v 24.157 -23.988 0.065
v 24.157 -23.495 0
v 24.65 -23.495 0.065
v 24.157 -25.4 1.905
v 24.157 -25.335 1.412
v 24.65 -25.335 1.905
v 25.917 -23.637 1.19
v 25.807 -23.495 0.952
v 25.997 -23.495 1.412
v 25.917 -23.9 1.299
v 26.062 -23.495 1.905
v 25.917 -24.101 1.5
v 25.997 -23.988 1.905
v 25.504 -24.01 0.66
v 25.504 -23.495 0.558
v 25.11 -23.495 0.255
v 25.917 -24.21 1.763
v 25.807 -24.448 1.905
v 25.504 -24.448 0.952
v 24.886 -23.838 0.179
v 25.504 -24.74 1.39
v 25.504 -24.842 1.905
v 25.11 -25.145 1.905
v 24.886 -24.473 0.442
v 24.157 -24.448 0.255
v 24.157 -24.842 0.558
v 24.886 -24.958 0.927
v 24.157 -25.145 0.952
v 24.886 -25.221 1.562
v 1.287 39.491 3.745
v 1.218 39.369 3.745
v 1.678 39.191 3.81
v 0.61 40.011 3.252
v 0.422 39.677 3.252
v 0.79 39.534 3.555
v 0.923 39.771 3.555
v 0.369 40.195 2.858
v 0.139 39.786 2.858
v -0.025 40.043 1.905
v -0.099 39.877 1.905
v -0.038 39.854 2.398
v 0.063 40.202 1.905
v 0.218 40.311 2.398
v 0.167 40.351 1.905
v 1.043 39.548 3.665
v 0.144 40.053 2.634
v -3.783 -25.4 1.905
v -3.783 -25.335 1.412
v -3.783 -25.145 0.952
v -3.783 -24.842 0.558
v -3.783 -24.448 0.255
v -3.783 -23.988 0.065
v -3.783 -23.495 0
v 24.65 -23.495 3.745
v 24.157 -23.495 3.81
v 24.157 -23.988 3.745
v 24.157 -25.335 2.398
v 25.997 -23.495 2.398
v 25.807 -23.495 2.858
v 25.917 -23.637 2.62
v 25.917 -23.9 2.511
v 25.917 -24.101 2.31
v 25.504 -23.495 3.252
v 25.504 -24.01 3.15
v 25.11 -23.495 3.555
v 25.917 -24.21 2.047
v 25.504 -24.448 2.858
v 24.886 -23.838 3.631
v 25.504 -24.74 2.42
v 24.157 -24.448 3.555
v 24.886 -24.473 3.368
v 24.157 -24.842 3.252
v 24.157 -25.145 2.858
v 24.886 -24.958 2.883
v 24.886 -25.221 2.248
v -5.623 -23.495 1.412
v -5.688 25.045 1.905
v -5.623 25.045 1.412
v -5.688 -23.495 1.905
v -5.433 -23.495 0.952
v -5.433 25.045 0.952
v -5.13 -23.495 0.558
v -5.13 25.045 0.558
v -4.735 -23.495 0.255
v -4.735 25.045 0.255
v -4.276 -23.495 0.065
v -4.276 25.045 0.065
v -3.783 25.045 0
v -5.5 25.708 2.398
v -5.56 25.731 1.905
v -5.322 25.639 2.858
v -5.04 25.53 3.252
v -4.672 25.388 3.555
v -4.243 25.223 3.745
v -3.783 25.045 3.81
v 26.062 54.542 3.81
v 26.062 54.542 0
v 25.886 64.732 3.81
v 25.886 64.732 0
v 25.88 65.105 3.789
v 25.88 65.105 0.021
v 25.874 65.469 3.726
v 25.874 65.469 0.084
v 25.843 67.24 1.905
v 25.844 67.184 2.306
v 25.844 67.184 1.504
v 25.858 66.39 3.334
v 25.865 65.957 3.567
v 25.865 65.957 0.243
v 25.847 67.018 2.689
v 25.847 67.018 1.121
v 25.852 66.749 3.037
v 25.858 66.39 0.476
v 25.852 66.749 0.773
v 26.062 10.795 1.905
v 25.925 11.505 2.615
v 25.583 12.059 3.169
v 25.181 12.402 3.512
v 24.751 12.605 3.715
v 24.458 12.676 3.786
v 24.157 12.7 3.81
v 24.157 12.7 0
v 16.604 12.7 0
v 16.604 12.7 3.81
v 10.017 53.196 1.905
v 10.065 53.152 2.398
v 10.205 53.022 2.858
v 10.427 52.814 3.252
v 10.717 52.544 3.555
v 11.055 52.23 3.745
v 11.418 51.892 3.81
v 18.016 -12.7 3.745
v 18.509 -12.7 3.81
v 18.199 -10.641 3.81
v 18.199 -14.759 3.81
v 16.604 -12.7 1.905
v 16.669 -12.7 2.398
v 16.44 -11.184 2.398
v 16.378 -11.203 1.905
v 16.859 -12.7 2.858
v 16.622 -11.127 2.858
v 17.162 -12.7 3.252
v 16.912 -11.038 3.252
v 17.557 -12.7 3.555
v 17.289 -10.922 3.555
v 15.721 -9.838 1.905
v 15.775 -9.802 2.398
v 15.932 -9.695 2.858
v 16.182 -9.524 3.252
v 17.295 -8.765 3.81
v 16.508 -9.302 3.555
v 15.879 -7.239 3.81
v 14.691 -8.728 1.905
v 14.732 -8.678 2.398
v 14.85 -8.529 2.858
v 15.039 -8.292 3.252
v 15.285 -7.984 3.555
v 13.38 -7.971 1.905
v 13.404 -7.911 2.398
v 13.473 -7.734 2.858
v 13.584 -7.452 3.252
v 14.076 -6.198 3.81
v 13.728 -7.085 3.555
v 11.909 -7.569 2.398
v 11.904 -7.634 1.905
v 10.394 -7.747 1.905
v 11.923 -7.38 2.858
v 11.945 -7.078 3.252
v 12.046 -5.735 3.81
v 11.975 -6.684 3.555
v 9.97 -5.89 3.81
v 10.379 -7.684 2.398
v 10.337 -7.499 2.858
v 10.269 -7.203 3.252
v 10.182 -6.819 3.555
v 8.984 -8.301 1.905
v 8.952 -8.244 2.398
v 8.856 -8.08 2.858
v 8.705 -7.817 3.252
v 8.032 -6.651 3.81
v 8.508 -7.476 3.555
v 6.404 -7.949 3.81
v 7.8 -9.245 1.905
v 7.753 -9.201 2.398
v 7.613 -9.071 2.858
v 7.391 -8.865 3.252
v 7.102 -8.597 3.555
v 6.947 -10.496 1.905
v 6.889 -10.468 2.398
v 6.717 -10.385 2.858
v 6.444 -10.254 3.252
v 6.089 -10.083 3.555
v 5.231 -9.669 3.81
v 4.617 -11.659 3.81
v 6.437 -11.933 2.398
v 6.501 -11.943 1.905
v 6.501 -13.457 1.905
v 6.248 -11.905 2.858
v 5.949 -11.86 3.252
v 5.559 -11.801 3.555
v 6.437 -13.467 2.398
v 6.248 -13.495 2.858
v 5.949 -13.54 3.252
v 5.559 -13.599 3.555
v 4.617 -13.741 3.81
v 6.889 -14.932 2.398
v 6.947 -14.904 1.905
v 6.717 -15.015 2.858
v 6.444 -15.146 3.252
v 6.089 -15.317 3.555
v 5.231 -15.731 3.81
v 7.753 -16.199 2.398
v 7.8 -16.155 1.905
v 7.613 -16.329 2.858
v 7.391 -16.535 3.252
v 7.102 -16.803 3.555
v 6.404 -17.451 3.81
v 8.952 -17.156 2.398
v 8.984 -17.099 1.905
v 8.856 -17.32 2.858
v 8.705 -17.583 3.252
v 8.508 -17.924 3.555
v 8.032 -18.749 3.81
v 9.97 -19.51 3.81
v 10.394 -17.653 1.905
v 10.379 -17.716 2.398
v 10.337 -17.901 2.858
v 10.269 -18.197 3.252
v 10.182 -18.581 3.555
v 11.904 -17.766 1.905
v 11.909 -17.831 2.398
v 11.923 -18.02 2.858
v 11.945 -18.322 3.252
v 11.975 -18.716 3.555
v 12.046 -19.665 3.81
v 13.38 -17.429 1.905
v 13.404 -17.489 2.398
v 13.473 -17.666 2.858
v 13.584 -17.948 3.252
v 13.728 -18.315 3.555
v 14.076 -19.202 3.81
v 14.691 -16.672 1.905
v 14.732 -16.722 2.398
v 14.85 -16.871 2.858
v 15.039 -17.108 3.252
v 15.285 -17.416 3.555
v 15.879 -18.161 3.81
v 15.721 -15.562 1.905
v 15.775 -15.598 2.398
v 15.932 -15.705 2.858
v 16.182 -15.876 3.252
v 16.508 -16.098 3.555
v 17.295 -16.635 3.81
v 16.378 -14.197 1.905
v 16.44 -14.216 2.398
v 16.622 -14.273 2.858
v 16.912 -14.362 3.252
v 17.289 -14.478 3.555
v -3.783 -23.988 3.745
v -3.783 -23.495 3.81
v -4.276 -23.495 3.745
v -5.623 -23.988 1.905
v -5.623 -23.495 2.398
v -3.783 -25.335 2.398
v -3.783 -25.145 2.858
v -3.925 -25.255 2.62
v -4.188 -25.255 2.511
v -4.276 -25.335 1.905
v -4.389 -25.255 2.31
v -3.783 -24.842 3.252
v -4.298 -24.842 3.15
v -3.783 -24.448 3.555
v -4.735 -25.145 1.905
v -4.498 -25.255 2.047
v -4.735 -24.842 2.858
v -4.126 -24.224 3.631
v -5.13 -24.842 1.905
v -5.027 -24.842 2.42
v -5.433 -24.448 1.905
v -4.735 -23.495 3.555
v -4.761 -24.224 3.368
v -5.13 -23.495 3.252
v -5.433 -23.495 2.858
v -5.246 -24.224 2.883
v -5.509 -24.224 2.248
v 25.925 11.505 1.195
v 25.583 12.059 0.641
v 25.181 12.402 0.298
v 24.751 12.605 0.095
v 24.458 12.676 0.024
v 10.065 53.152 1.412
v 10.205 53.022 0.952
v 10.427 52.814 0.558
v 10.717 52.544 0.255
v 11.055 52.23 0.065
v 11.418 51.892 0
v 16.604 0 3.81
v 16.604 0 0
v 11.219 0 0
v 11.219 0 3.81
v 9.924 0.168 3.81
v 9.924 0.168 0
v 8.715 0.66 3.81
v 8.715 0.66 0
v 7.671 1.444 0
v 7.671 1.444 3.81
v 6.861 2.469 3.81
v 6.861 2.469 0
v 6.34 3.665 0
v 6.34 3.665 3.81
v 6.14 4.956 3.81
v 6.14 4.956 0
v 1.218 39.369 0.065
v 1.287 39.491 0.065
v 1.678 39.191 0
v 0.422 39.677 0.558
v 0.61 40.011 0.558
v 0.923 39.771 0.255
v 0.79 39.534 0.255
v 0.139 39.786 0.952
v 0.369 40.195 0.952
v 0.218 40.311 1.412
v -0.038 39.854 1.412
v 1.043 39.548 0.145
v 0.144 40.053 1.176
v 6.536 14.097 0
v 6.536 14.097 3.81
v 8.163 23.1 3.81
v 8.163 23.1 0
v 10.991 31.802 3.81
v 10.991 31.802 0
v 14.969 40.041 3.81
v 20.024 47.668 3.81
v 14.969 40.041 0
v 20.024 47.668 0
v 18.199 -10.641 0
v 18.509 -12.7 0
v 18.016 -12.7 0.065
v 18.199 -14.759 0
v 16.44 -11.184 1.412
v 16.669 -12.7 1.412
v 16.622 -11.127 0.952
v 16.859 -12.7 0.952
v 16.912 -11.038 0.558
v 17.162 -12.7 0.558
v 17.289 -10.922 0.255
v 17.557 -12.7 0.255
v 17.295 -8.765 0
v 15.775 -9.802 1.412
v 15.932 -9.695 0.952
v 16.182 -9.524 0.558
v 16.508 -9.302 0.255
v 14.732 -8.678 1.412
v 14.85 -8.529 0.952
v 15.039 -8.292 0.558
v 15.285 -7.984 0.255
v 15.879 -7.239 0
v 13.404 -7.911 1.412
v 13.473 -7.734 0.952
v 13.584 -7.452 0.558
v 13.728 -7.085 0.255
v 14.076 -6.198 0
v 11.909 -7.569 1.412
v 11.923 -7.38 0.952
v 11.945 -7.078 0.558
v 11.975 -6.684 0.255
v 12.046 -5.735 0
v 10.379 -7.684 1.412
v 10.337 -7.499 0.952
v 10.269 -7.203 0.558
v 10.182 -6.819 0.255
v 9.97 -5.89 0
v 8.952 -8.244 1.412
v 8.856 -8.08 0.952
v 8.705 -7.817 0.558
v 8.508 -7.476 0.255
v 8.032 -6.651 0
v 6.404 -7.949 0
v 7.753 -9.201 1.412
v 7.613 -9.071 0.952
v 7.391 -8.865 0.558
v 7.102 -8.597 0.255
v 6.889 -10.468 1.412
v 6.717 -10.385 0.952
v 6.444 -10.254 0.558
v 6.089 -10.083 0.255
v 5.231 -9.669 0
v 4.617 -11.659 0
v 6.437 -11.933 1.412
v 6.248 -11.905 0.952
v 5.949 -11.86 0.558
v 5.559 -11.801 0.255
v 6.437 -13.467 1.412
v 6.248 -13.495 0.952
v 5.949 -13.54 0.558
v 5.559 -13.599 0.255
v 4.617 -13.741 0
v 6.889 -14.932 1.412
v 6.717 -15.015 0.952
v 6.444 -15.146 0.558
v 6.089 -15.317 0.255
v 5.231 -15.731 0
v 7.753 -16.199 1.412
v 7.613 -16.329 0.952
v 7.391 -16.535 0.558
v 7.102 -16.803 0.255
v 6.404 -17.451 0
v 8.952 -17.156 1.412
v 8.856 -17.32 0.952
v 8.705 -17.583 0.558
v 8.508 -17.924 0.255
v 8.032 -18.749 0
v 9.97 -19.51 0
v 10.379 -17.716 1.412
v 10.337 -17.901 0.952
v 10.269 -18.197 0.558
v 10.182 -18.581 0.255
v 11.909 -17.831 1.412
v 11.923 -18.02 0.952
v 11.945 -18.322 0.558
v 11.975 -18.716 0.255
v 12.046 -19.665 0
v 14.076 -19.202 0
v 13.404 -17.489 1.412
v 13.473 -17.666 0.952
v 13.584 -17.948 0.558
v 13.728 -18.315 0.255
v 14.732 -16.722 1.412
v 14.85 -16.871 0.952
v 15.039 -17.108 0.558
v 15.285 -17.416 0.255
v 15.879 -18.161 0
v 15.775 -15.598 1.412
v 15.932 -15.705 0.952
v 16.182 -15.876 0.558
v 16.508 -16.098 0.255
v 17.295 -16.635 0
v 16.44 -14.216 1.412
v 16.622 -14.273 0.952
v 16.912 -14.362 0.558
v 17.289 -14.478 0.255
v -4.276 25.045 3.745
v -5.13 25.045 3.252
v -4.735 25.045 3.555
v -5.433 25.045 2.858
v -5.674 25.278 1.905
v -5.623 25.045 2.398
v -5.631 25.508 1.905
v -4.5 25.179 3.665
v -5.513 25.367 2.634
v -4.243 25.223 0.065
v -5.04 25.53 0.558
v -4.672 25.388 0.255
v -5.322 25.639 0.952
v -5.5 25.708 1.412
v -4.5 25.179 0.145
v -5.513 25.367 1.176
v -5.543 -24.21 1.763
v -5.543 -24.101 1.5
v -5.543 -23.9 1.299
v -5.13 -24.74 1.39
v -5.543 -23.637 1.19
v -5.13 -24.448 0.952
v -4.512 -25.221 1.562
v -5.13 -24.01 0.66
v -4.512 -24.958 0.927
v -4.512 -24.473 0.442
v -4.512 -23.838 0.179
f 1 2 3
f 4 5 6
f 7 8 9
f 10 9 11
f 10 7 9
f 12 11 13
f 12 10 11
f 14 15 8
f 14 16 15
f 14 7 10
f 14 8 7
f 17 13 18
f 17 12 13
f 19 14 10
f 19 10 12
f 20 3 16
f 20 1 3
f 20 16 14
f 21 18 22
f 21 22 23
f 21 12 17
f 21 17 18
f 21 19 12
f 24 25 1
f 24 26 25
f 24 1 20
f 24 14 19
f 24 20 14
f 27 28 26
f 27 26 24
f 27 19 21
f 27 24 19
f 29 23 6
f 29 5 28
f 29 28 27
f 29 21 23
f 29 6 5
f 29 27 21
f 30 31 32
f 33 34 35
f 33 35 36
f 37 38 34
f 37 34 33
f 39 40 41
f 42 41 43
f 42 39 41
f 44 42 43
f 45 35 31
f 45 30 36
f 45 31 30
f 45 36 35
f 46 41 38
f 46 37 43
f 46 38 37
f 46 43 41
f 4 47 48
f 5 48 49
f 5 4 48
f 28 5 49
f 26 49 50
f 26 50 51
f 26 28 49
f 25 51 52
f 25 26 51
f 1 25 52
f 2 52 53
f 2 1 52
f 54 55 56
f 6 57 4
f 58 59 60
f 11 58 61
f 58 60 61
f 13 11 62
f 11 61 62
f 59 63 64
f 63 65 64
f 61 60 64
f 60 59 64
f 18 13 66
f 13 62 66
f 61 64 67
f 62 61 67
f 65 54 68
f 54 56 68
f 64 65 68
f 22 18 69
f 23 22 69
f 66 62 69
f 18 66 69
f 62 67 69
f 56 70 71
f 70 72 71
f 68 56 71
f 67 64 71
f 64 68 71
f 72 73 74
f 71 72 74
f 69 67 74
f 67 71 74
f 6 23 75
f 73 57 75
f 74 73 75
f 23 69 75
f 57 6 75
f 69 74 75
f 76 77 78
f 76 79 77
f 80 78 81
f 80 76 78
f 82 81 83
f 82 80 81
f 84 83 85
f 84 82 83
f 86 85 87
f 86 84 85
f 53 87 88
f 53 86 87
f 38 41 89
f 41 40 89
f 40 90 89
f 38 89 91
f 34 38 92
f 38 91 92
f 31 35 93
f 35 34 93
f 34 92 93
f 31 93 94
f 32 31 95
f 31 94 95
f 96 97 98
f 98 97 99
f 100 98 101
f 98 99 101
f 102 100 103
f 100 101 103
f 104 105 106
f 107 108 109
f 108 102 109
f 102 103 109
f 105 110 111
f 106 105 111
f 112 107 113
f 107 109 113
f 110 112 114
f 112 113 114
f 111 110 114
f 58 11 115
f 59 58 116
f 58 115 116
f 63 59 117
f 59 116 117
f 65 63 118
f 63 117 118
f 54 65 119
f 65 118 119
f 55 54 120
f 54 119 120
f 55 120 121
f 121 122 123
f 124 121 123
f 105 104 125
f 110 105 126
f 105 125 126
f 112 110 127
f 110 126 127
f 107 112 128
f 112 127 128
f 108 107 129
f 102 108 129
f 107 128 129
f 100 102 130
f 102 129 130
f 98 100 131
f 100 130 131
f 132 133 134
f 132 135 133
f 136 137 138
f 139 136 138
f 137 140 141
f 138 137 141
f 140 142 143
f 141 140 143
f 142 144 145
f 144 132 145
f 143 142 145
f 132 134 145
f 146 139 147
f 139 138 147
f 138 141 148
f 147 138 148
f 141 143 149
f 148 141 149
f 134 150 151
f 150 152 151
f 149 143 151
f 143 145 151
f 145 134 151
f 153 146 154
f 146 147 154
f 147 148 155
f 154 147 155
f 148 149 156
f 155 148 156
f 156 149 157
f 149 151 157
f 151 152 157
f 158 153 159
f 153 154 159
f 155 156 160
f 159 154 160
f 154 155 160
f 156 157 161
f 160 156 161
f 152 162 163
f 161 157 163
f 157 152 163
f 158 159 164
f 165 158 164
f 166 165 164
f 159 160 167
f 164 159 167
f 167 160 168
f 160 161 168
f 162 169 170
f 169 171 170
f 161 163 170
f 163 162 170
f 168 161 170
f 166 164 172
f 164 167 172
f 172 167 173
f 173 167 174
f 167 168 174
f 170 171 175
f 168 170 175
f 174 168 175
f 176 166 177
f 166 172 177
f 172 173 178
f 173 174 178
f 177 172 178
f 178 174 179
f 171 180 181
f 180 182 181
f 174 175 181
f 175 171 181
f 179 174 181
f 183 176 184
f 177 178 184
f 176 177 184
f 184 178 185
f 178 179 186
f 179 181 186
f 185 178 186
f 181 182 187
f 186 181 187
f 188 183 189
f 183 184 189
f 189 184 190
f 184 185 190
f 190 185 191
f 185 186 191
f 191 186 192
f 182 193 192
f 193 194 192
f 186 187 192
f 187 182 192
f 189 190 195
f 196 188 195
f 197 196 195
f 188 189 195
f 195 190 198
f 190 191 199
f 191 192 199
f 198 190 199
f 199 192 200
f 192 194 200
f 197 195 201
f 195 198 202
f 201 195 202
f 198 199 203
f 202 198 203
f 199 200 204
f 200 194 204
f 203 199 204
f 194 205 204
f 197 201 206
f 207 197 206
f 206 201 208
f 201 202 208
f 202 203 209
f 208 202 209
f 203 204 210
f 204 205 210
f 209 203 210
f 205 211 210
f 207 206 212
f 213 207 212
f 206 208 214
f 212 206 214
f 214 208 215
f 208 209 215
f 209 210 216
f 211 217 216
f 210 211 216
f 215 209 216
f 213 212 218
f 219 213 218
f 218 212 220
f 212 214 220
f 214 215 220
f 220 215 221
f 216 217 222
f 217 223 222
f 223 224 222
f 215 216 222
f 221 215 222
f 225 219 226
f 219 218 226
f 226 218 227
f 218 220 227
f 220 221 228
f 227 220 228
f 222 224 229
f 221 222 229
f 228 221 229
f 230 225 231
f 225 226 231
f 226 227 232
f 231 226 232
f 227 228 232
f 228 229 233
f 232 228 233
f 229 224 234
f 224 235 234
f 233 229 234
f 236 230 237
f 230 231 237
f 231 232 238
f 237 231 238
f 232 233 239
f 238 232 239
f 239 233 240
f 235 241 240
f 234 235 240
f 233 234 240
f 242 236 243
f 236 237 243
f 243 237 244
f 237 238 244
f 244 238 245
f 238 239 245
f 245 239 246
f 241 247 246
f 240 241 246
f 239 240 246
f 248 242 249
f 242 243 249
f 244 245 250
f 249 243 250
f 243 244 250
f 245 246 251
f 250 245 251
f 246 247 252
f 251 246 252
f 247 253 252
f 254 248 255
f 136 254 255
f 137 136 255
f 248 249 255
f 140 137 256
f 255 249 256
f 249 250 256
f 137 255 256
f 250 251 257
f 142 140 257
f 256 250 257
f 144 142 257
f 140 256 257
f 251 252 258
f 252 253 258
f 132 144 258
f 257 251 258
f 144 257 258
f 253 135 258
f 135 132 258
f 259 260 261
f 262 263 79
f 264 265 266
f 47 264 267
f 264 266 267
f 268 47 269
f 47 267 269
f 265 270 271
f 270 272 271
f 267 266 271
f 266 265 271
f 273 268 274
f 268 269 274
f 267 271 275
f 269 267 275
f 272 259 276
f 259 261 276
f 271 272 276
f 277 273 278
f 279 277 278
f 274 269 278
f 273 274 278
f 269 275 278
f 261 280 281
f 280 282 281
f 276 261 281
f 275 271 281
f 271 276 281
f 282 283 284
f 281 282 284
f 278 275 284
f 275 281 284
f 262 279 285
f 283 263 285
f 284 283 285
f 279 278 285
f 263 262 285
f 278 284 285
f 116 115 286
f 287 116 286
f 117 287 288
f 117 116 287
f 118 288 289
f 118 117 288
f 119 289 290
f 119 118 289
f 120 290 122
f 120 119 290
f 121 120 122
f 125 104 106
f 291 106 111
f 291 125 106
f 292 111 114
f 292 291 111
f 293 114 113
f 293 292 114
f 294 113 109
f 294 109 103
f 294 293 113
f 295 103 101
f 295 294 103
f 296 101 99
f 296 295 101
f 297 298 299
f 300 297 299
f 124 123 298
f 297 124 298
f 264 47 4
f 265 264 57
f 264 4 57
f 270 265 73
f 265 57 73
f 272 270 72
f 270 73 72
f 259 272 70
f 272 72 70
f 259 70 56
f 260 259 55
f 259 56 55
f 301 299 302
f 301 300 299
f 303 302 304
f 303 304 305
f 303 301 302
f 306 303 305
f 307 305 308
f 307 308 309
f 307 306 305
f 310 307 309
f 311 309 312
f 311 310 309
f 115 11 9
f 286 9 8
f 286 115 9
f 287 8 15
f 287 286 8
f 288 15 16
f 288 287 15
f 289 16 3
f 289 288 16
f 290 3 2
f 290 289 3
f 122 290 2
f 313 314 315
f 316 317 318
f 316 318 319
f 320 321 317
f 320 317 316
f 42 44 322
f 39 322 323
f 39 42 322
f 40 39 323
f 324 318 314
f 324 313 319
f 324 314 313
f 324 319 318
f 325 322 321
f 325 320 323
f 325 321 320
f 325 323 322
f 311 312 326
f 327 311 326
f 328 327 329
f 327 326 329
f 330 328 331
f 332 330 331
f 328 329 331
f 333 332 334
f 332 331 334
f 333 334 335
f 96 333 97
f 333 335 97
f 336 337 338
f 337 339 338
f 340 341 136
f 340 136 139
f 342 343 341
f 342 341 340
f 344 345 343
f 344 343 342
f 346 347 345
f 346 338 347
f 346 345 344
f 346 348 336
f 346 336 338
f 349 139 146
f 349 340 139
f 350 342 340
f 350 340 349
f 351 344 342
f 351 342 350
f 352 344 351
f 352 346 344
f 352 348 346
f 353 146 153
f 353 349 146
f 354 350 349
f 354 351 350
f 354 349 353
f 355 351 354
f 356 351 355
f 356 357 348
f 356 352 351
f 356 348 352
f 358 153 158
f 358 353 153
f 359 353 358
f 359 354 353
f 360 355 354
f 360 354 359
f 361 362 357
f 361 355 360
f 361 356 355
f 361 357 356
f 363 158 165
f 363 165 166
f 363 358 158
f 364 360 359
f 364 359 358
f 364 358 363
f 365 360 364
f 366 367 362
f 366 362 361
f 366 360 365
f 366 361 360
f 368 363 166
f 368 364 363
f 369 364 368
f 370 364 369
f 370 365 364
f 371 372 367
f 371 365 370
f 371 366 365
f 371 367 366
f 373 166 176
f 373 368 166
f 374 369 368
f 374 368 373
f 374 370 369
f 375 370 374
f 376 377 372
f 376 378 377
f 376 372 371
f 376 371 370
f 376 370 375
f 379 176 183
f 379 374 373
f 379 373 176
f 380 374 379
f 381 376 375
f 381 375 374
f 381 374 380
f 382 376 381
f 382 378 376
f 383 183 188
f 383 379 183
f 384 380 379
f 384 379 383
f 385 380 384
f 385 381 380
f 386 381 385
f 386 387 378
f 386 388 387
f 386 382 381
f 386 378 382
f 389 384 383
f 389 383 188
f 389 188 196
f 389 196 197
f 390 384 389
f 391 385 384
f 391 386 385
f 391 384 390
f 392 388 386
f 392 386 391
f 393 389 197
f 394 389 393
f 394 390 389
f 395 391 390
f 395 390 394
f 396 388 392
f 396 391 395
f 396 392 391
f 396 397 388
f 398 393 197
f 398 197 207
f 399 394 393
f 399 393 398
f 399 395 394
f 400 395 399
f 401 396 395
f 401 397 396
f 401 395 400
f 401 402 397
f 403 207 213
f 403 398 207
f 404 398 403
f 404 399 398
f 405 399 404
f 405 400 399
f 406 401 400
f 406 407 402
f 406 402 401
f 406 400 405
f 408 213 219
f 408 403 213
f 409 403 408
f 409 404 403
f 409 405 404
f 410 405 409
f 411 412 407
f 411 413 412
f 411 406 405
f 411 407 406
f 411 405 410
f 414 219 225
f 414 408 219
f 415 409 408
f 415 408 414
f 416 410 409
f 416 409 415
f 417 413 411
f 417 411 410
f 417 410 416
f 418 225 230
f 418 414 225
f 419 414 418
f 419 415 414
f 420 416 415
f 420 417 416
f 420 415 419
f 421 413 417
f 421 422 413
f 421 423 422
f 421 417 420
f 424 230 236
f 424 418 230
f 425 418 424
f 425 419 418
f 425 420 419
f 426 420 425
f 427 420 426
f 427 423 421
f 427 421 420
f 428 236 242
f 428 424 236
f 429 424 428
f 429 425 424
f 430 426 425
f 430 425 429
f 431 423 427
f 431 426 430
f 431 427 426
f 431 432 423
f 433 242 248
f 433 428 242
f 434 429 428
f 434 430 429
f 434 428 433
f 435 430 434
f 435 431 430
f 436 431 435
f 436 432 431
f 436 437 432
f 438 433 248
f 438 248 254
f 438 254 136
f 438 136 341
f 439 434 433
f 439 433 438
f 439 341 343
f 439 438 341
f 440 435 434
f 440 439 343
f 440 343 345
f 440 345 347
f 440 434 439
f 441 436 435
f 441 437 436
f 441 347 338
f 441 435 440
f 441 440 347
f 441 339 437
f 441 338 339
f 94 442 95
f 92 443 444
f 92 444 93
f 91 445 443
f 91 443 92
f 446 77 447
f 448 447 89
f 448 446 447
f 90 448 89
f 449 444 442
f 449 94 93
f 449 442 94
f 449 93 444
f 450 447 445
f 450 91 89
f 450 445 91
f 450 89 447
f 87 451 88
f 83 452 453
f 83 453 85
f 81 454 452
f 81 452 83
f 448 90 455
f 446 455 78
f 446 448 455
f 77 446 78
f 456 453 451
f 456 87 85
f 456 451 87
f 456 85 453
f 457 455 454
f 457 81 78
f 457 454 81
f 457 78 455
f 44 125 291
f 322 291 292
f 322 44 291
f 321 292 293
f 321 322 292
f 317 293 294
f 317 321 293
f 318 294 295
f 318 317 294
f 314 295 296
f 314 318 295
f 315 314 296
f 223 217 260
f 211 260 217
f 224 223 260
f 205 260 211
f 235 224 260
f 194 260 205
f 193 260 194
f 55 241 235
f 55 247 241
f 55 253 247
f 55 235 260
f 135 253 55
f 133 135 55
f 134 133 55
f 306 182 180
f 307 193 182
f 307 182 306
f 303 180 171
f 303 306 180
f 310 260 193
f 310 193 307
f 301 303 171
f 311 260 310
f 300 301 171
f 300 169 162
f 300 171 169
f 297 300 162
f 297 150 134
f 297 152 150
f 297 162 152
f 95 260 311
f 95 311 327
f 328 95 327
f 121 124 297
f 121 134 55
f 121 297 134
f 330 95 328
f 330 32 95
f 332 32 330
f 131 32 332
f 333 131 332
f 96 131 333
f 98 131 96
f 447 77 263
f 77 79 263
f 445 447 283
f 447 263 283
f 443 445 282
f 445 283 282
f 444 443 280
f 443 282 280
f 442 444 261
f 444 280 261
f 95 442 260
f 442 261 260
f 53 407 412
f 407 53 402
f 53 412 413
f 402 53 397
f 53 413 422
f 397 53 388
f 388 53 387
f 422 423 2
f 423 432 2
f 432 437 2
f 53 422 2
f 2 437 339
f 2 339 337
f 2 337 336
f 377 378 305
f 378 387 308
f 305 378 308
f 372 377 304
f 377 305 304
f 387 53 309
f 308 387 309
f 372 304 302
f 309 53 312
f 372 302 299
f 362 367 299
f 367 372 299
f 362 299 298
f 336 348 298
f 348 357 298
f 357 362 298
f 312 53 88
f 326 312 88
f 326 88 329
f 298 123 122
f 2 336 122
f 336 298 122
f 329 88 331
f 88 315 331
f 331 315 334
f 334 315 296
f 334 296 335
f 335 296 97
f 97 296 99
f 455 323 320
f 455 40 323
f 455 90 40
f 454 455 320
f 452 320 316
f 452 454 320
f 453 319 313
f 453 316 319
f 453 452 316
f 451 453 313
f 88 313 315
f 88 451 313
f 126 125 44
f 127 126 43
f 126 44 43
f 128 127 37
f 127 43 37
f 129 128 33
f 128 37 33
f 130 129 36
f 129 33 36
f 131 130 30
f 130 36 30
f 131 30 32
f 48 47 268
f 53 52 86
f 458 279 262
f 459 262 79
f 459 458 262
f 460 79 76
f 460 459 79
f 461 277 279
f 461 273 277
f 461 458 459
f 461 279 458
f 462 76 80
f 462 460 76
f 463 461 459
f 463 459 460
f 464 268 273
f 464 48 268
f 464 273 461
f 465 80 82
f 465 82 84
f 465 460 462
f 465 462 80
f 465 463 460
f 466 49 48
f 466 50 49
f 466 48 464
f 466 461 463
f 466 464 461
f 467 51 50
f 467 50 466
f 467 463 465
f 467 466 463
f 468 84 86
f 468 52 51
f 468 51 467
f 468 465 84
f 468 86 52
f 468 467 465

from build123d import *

# Parameters (mm, degrees)
F0_R     = 5.08
F1_DEPTH = 3.81
F2_R     = 1.90499
F4_R     = 5.08


# Not quite as in the source:
# - two fillets or chamfers of one size are made in one step
# - a fillet or chamfer is up to 0.001 mm smaller than in the source, because OpenCascade refuses the exact size


with BuildPart() as f1:
    # F0 (on Top) → F1 (new body)
    with BuildSketch(Plane.XY):
        with BuildLine():
            Line((-5.6879511814, 25.4), (-5.6879511814, -25.4))
            Line((-5.6879511814, -25.4), (5.6879511814, -25.4))
            Line((5.6879511814, -25.4), (26.0620488186, -25.4))
            Line((26.0620488186, -25.4), (26.0620488186, 0))
            Line((26.0620488186, 0), (26.0620488186, 12.7))
            Line((26.0620488186, 12.7), (16.6040229345, 12.7))
            Line((16.6040229345, 12.7), (16.6040229345, 0))
            Line((16.6040229345, 0), (6.4440229345, 0))
            ThreePointArc((6.4440229345, 0), (10.1083489192, 29.4811569654), (26.0620488186, 54.5419901609))
            Line((26.0620488186, 54.5419901609), (25.8431795214, 67.2401040457))
            Line((25.8431795214, 67.2401040457), (10.0171072409, 53.1962551177))
            Line((10.0171072409, 53.1962551177), (0, 40.1331372559))
            Line((0, 40.1331372559), (-5.6879511814, 25.4))
        make_face()
        with Locations((11.5240229345, -12.7)):
            Circle(F0_R, mode=Mode.SUBTRACT)
    extrude(amount=F1_DEPTH)

    # F2 (radius 1.905 in the source; OpenCascade refuses exactly that, so slightly less here)
    f2_edges = [f1.edges().sort_by_distance(p)[0] for p in [
        (-5.687951, 0, 3.81),
        (10.187049, -25.4, 3.81),
        (10.187049, -25.4, 0),
        (26.062049, -6.35, 3.81),
        (26.062049, -6.35, 0),
        (26.062049, -25.4, 1.905),
        (-5.687951, -25.4, 1.905),
        (26.062049, 12.7, 1.905),
        (-2.843976, 32.766569, 3.81),
        (-2.843976, 32.766569, 0),
        (-5.687951, 0, 0),
        (6.444023, -12.7, 0),
        (6.444023, -12.7, 3.81),
        (17.930143, 60.21818, 0),
        (17.930143, 60.21818, 3.81),
        (5.008554, 46.664696, 3.81),
        (-5.687951, 25.4, 1.905),
        (0, 40.133137, 1.905),
        (5.008554, 46.664696, 0),
    ]]
    fillet(f2_edges, radius=F2_R)

    # F4
    f4_edges = [f1.edges().sort_by_distance(p)[0] for p in [
        (6.444023, 0, 1.905),
    ]]
    fillet(f4_edges, radius=F4_R)


solid = f1.part
